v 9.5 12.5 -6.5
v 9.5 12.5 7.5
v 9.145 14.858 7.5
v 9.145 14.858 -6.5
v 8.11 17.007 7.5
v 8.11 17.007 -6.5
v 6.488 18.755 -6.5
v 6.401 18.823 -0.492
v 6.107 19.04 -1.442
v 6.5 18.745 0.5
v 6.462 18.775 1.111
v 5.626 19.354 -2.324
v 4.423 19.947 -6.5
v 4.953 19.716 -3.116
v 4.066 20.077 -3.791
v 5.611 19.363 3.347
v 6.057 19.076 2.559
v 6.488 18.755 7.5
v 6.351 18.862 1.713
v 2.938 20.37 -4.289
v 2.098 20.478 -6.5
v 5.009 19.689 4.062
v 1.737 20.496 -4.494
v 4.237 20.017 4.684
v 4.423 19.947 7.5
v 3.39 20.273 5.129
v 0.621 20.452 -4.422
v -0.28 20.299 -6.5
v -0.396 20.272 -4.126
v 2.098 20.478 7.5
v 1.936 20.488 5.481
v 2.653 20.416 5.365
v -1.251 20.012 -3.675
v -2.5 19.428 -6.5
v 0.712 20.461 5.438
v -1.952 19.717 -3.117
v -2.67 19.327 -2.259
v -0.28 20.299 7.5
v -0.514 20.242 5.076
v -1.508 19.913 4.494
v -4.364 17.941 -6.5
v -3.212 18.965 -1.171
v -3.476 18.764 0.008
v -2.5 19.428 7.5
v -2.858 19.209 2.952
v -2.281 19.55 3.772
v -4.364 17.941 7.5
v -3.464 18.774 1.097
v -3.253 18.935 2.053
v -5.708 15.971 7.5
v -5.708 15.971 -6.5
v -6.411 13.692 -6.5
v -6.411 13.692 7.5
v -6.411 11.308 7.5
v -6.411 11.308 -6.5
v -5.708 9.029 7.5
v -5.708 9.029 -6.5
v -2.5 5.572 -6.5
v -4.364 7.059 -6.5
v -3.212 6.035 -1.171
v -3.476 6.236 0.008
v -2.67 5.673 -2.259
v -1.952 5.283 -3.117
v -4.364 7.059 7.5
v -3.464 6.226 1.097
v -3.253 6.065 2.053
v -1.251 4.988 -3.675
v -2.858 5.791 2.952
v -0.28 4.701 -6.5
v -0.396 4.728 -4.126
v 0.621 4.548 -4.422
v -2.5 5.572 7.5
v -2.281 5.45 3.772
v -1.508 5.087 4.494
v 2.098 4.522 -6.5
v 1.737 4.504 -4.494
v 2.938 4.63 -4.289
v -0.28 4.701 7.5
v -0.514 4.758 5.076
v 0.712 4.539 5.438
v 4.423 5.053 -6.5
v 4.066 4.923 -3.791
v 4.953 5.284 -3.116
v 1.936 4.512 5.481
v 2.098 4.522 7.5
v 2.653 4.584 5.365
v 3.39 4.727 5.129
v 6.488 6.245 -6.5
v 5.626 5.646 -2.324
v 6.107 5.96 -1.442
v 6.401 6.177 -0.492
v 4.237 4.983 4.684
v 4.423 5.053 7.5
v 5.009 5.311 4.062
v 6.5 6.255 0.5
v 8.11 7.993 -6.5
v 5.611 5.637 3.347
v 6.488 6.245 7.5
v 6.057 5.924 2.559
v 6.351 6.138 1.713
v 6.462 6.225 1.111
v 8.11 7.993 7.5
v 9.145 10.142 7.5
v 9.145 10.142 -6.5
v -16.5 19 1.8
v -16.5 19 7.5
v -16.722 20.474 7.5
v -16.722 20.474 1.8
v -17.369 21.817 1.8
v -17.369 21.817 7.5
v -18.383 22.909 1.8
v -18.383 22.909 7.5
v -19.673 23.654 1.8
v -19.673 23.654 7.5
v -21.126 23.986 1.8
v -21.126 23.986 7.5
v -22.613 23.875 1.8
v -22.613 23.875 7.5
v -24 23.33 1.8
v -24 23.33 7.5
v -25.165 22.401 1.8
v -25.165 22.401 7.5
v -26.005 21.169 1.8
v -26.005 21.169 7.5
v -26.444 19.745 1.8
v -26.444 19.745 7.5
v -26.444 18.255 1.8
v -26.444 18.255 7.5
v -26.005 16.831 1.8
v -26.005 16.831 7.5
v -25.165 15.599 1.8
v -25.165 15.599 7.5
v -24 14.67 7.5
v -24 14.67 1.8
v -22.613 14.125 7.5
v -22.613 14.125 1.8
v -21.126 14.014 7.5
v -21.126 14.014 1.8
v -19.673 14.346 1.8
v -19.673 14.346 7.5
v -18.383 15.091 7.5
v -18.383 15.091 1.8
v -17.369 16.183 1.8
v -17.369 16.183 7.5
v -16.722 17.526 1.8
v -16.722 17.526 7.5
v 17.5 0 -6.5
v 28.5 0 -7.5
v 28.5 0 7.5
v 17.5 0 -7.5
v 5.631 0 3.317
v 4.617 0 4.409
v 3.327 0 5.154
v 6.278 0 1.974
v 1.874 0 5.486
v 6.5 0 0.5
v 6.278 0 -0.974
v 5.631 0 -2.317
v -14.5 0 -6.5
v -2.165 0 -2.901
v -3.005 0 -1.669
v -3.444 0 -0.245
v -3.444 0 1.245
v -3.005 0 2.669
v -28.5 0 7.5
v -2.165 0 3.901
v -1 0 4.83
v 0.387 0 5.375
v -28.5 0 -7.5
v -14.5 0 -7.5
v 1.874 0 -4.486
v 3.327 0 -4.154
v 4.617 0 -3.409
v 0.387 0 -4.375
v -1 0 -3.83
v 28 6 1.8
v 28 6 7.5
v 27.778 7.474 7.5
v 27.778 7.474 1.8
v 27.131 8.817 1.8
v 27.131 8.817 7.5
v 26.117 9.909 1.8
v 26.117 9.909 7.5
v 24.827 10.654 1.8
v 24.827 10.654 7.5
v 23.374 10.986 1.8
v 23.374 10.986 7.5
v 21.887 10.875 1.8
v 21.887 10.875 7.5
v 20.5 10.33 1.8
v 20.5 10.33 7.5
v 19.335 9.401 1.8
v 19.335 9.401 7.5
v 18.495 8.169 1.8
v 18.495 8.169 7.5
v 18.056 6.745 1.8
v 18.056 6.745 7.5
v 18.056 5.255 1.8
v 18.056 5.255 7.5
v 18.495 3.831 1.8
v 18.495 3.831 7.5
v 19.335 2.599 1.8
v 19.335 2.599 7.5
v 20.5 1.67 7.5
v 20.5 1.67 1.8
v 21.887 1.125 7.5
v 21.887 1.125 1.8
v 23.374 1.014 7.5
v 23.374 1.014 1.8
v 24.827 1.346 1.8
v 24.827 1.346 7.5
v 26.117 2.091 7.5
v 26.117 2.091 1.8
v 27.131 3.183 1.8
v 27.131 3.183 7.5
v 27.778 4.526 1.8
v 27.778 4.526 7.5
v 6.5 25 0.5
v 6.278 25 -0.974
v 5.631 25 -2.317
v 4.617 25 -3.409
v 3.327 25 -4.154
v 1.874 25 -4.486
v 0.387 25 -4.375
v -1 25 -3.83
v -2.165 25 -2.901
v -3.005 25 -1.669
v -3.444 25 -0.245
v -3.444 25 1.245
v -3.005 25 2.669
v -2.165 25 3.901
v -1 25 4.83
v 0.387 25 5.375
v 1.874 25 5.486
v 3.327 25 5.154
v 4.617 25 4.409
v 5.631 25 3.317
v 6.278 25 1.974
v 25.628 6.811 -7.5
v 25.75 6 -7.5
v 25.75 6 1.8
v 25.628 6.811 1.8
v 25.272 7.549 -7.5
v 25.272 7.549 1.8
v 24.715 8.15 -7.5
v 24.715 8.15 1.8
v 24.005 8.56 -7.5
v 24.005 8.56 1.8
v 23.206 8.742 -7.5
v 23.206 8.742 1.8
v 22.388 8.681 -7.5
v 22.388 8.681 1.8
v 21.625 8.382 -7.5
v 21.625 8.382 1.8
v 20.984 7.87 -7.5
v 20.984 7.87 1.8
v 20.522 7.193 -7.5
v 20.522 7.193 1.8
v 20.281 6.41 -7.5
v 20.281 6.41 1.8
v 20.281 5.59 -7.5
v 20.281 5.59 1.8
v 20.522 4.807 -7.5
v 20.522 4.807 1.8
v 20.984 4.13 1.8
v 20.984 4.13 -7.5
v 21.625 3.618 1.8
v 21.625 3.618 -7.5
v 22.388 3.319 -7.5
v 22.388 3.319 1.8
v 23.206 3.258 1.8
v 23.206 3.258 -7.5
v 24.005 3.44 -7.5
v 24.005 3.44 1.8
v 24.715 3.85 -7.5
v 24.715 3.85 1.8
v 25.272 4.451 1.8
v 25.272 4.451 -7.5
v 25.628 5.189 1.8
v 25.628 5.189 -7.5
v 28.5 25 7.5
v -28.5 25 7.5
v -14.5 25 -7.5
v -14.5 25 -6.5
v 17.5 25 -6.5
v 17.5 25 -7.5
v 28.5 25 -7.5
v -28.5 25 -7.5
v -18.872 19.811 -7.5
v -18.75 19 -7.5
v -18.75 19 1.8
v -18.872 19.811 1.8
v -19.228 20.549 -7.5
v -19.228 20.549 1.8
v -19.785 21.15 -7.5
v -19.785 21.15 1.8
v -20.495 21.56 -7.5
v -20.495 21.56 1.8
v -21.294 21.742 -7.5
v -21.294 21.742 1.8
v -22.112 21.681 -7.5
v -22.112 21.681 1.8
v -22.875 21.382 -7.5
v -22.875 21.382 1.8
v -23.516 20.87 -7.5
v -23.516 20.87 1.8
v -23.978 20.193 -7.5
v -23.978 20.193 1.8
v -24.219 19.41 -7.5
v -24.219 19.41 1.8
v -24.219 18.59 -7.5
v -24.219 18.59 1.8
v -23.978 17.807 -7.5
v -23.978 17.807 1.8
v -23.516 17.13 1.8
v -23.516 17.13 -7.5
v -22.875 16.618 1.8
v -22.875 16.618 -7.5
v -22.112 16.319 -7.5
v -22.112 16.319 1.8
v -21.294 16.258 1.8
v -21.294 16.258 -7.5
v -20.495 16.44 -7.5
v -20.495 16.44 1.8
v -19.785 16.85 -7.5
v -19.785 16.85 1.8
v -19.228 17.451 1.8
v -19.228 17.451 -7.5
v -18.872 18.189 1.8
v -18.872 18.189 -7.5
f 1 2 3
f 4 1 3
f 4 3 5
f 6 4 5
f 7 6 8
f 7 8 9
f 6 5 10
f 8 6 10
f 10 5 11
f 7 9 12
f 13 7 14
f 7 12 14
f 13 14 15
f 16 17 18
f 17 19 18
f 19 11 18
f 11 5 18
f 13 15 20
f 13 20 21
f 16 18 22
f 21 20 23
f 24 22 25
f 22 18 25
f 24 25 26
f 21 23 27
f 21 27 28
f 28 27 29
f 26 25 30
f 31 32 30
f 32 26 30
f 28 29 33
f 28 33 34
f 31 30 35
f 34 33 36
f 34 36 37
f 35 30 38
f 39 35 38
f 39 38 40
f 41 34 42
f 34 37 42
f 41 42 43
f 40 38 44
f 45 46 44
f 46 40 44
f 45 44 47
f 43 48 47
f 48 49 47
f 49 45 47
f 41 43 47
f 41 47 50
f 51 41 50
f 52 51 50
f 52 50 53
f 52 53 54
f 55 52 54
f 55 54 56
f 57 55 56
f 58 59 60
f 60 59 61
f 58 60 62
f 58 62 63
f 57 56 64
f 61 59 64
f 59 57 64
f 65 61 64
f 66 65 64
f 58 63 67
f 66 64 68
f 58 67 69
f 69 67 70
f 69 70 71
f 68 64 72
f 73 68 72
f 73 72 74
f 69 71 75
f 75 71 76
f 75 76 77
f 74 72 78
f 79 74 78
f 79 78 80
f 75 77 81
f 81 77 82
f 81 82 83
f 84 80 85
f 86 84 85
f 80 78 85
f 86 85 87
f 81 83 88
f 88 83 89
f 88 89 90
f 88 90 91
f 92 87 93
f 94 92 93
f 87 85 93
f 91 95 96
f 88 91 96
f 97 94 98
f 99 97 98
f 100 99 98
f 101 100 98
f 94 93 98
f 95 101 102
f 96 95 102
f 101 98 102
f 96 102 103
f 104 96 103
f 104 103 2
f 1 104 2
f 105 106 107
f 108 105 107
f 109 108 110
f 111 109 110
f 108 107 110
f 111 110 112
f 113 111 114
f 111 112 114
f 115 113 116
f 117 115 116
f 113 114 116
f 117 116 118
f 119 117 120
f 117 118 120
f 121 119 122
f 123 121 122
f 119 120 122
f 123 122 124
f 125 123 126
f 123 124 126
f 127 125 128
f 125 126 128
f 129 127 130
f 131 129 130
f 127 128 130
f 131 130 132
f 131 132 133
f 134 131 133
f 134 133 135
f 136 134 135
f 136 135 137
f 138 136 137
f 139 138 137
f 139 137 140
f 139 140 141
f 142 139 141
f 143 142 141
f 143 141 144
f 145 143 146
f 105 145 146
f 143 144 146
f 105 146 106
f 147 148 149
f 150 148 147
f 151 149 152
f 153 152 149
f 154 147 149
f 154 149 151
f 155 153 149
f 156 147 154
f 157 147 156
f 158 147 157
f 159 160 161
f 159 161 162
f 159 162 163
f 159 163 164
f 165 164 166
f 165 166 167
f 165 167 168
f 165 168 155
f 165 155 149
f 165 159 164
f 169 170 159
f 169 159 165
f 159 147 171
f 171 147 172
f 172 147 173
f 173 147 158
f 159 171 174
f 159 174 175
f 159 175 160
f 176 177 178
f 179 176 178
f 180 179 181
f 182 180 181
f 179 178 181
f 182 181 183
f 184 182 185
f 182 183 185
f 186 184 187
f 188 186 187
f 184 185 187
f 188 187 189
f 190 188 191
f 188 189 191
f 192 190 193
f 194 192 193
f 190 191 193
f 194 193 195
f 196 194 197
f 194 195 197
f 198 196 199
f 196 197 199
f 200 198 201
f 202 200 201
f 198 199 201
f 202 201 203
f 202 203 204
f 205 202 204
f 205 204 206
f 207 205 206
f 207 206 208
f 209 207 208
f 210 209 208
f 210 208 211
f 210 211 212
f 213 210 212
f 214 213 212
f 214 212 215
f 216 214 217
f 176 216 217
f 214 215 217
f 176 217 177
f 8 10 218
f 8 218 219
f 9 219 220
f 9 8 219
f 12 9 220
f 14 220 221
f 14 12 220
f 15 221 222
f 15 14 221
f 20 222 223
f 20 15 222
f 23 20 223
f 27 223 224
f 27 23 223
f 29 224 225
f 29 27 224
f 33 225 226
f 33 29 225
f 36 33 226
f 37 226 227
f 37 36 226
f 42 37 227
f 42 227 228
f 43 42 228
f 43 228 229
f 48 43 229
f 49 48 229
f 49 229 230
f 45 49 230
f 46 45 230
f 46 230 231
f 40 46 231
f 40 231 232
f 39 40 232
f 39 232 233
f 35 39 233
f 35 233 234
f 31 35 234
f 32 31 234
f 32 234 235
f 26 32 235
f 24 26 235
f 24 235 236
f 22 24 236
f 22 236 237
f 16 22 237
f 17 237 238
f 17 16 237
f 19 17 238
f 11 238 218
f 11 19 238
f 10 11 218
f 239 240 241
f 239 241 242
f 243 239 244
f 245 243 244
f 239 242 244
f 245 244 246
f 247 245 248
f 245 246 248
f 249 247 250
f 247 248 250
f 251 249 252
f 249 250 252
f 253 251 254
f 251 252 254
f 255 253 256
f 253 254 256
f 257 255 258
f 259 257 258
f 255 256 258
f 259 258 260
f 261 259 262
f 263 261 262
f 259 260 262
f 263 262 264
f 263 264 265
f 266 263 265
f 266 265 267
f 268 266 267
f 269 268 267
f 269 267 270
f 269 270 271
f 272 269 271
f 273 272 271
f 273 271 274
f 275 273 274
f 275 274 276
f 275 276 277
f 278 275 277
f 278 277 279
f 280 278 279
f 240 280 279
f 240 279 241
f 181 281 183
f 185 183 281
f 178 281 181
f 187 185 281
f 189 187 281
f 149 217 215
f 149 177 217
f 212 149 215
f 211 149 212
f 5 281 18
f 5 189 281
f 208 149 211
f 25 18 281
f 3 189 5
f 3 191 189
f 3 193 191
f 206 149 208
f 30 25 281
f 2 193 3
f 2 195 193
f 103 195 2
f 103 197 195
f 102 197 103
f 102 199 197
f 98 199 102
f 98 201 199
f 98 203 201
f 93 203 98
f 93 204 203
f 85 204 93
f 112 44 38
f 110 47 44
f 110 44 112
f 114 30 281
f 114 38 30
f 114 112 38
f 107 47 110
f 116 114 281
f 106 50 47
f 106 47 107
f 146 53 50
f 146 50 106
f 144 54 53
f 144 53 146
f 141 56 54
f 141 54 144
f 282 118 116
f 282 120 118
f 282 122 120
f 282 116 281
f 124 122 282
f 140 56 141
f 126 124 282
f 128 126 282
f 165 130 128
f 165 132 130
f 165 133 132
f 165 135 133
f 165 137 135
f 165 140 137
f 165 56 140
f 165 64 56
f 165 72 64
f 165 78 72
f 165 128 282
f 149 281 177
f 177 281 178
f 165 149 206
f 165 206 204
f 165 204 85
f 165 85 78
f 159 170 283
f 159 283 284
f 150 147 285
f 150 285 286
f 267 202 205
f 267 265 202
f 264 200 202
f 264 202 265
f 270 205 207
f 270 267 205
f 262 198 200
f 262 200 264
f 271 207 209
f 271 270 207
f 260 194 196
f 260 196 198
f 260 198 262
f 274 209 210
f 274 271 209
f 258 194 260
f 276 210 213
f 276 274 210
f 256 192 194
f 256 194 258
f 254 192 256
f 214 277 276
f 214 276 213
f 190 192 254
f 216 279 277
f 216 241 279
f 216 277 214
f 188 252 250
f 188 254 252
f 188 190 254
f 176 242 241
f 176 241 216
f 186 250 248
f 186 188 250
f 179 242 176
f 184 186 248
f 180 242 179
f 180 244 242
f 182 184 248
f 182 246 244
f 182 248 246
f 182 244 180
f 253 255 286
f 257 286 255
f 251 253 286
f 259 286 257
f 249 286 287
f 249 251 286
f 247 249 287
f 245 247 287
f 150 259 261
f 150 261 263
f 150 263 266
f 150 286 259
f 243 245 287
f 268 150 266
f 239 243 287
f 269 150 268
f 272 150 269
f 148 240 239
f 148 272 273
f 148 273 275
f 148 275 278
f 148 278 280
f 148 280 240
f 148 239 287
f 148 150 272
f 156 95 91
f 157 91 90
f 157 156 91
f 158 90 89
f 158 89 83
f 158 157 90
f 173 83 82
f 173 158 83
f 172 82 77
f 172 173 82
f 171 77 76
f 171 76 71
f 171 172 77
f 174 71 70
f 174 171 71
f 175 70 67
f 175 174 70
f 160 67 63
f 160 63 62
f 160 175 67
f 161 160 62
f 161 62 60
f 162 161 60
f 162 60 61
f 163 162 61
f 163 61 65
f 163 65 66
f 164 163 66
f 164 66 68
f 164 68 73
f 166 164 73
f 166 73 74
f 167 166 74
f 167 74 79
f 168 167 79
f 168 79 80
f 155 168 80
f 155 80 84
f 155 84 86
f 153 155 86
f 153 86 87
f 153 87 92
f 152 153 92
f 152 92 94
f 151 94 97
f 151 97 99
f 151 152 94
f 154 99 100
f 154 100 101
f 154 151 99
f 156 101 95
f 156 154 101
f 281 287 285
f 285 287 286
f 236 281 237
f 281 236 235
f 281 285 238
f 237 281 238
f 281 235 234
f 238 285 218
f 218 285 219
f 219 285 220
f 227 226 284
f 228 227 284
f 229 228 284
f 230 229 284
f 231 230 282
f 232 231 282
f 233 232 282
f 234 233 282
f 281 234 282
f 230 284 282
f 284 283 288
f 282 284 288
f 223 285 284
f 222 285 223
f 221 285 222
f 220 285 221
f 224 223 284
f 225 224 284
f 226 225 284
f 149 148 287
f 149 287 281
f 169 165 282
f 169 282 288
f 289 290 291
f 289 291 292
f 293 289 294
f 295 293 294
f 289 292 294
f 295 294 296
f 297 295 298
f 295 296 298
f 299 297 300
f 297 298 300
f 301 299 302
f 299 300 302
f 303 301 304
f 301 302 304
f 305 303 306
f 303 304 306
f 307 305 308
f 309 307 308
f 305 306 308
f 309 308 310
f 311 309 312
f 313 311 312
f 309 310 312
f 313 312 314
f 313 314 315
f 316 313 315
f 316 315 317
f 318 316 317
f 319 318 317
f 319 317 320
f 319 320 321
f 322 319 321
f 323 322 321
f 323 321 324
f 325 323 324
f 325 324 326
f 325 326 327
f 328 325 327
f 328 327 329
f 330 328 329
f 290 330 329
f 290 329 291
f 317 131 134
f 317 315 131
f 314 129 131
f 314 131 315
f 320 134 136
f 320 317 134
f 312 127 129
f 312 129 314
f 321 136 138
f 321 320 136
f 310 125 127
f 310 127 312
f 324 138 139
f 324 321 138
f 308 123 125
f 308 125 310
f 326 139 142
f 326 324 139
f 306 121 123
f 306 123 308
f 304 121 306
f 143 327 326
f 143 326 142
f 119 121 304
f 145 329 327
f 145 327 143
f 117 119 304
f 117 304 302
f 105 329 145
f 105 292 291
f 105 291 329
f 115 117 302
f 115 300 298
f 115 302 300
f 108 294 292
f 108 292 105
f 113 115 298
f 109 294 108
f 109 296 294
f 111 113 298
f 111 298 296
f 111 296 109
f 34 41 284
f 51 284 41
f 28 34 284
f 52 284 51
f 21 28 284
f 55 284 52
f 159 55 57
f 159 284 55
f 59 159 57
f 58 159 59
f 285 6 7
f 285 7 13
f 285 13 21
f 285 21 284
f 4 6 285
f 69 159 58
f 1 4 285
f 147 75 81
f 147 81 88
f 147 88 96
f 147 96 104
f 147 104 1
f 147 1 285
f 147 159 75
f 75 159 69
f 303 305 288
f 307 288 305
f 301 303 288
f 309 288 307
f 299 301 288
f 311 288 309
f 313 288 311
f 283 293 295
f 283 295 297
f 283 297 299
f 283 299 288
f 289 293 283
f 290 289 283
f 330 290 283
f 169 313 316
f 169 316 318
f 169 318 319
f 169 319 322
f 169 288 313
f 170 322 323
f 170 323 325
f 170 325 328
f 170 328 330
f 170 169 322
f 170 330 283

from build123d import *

# Parameters (mm, degrees)
SKETCH1_R           = 5
BOSS_EXTRUDE2_DEPTH = 25
SKETCH3_R           = 2.75
SKETCH3_R_2         = 8
CUT_EXTRUDE1_DEPTH  = 16
SKETCH4_R           = 5
CUT_EXTRUDE2_DEPTH  = 5.7


with BuildPart() as part:
    # Sketch1 → Boss-Extrude2 (new body)
    with BuildSketch(Plane(origin=(0, 0, 0), x_dir=(1, 0, 0), z_dir=(0, 1, 0))):
        Polygon((-14.5, 7.5), (-14.5, 6.5), (17.5, 6.5), (17.5, 7.5), (28.5, 7.5), (28.5, -7.5), (-28.5, -7.5), (-28.5, 7.5), align=None)
        with Locations((1.5, -0.5)):
            Circle(SKETCH1_R, mode=Mode.SUBTRACT)
    extrude(amount=BOSS_EXTRUDE2_DEPTH)

    # Sketch3 → Cut-Extrude1 (cut, through all)
    with BuildSketch(Plane.XY.offset(7.5)):
        with Locations((-21.5, 19)):
            Circle(SKETCH3_R)
        with Locations((1.5, 12.5)):
            Circle(SKETCH3_R_2)
        with Locations((23, 6)):
            Circle(SKETCH3_R)
    extrude(amount=-CUT_EXTRUDE1_DEPTH, mode=Mode.SUBTRACT)

    # Sketch4 → Cut-Extrude2 (cut)
    with BuildSketch(Plane.XY.offset(7.5)):
        with Locations((-21.5, 19)):
            Circle(SKETCH4_R)
        with Locations((23, 6)):
            Circle(SKETCH4_R)
    extrude(amount=-CUT_EXTRUDE2_DEPTH, mode=Mode.SUBTRACT)


solid = part.part
